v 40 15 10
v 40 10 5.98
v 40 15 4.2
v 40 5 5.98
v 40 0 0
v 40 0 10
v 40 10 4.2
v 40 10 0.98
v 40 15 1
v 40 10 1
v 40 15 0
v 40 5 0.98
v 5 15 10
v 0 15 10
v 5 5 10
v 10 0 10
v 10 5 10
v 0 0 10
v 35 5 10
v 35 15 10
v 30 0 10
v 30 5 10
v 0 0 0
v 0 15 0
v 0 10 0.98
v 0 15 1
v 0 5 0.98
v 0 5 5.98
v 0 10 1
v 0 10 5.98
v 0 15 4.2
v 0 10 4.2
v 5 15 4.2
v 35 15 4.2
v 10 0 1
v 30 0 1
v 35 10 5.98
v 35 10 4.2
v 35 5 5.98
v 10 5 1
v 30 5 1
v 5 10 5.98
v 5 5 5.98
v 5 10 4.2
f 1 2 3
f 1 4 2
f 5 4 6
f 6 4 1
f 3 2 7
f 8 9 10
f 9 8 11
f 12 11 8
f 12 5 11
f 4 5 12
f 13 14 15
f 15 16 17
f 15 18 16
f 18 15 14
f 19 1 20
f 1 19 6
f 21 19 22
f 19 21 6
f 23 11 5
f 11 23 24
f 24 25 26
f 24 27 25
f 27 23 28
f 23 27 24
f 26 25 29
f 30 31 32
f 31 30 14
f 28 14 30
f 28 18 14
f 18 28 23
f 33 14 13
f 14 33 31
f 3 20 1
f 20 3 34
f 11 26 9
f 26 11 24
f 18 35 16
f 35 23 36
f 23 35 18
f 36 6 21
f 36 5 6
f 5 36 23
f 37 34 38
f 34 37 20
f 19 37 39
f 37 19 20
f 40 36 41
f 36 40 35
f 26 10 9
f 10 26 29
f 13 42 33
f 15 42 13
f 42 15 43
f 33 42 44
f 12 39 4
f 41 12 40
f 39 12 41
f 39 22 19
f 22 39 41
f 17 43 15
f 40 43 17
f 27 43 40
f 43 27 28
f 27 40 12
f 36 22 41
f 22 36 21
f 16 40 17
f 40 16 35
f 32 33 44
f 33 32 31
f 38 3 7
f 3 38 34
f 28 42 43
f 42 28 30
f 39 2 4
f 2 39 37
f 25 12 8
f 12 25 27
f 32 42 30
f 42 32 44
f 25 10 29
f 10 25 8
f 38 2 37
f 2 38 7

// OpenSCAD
$fn=100;

//difference() {
//  cube([40, 20, 10]);
//  
//  translate([-0.01, -0.01, -0.01]) {    
//    cube([50, 10, 5]);  
//  }
//
//  translate([5, -10, 5 - 0.02])
//    cube([30, 20, 10]);
//  
//  translate([10, -1, 1 - 0.02])
//    cube([20, 25, 10]);
//  
//  translate([5, 15, -2]) {
//    cylinder(20, 2, 2);
//    
//    translate([0, 0, 10])
//      cylinder(3, 2, 5);
//  }
//  
//  translate([35, 15, -2]) {
//    cylinder(20, 2, 2);
//    
//    translate([0, 0, 10])
//      cylinder(3, 2, 5);
//  }
//}


difference() {
  cube([40, 15, 10]);
  
  translate([5, 5, 1])
    cube([30, 25, 10]);
  
  translate([10, -1, 1])
    cube([20, 25, 10]);  
  
  translate([-1, 5, 1]) {    
    cube([50, 30, 3.2]);  
  }

  translate([-0.01, 5, 1 - 0.02]) {    
    cube([50, 5, 5]);  
  }
}



//translate([0, 5.2, 2])
//color("blue")
//  difference() {
//    
//    translate([0, 0, 0])    
//      cube([40, 4.6, 20]);
//    
//    translate([-0.01, -1 , 2.2])
//      cube([5.2, 12, 20]);
//
//    translate([40.01 - 5.2, -1 , 2.2])
//      cube([5.2, 12, 20]);
//
//    translate([10, -1, -0.01])
//      cube([20, 12, 15]);
//    
//  }
